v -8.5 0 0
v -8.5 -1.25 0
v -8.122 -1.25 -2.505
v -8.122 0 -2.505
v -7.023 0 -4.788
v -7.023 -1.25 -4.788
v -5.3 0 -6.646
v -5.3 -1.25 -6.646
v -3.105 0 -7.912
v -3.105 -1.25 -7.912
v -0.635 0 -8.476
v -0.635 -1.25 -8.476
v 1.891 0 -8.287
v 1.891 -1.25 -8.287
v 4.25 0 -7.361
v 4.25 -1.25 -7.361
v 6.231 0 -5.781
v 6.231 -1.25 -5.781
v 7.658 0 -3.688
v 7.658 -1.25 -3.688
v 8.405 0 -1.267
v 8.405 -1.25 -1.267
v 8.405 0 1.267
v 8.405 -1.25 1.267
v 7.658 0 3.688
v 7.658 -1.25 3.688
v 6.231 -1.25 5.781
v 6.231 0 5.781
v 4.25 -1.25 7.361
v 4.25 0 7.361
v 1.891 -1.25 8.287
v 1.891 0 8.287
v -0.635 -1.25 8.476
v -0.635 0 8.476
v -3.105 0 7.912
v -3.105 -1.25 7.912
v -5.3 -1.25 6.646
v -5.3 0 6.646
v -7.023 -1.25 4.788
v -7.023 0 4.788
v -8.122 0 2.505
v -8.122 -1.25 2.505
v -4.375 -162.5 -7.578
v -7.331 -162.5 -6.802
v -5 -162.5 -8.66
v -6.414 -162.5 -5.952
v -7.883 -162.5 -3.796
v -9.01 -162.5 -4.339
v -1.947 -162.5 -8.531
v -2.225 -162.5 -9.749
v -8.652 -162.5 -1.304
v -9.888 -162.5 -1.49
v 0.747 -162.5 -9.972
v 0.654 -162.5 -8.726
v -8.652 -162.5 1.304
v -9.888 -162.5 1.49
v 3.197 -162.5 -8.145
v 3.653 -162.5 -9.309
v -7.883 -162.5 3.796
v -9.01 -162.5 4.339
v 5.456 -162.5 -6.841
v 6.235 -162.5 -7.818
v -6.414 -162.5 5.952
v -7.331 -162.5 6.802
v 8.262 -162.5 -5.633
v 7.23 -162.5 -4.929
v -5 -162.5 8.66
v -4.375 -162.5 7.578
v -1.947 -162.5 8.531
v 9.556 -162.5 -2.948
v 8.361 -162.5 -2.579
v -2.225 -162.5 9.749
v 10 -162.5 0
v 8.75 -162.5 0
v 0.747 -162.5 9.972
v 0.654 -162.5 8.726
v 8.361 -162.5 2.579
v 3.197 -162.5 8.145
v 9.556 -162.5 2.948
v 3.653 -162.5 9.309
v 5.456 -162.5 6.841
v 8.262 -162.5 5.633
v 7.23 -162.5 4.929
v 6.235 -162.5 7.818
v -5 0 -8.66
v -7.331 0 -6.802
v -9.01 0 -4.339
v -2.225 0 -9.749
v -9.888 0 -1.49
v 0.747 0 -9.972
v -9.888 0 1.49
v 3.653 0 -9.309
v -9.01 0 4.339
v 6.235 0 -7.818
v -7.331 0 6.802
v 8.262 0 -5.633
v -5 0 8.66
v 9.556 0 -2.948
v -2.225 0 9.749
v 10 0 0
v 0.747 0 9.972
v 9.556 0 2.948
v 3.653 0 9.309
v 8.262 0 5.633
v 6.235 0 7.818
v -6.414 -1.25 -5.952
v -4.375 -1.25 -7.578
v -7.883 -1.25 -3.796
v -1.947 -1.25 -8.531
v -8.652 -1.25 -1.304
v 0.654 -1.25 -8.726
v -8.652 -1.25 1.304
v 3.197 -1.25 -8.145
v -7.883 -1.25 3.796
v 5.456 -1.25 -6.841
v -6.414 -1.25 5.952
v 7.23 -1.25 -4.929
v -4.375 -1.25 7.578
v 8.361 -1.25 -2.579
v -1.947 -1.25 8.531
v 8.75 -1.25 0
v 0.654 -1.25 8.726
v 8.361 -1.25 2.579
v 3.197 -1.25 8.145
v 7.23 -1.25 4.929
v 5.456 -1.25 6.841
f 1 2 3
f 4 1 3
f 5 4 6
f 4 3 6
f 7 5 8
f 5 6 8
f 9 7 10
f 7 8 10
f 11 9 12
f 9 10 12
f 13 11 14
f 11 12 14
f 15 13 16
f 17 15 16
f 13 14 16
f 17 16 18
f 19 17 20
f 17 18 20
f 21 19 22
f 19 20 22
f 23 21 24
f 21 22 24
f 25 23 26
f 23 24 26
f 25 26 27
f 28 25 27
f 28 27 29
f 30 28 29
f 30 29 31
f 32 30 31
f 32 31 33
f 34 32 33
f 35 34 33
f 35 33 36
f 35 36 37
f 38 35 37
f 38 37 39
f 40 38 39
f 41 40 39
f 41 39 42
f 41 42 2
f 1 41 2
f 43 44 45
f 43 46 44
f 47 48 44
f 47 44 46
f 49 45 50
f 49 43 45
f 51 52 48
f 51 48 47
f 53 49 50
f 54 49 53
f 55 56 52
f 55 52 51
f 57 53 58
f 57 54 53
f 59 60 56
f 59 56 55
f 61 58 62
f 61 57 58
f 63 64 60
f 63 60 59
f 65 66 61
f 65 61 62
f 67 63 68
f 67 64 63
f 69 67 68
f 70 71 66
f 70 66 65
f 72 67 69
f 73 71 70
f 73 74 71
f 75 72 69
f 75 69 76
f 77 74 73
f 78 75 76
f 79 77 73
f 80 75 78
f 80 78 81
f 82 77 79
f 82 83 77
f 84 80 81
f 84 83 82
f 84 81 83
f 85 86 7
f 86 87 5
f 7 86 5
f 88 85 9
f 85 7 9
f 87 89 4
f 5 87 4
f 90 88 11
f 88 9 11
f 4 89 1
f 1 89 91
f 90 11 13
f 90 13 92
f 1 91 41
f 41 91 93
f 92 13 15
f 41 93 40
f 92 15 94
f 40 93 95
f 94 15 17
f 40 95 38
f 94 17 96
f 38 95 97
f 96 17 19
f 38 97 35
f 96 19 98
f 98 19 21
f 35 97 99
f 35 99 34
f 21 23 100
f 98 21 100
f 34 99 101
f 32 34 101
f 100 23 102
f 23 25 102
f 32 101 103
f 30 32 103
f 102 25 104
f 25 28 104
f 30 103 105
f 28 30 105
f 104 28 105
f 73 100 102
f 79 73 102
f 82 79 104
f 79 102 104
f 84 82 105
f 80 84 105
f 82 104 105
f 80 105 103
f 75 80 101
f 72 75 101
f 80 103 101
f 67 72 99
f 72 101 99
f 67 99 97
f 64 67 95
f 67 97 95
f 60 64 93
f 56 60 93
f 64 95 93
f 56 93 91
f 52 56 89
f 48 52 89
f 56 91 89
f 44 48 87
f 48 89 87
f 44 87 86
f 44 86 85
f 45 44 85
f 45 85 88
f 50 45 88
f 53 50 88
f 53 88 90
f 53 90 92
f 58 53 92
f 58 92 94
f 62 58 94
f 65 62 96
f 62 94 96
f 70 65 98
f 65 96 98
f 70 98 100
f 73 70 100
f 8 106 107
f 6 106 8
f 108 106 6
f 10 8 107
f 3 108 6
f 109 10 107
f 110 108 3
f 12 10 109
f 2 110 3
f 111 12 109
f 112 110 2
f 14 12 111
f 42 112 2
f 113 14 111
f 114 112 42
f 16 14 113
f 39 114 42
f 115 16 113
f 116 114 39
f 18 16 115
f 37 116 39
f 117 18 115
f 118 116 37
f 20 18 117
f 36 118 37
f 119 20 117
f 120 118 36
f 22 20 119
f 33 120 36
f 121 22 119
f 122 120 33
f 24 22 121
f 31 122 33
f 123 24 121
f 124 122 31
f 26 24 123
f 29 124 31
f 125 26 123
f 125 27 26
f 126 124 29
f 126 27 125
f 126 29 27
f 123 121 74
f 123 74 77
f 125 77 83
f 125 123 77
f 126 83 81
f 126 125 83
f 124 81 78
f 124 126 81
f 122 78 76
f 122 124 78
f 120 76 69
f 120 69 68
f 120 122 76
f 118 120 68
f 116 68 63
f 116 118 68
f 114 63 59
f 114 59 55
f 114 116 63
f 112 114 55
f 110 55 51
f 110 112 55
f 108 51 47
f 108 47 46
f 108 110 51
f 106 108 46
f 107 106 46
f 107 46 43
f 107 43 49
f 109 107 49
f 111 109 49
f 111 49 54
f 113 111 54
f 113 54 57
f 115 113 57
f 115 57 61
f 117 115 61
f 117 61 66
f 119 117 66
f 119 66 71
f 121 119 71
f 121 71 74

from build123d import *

# Parameters (mm, degrees)
F0_R     = 10
F1_DEPTH = 162.5
F2_T     = -1.25
F3_D     = 17


with BuildPart() as f1:
    # F0 (on Front) → F1 (new body)
    with BuildSketch(Plane.XZ):
        Circle(F0_R)
    extrude(amount=F1_DEPTH)

    # F2
    f2_openings = [f1.faces().sort_by_distance(p)[0] for p in [
        (0, -162.5, 0),
    ]]
    offset(amount=F2_T, openings=f2_openings)

    # F3 (through all)
    with Locations(Plane(origin=(0, 0, 0), x_dir=(1, 0, 0), z_dir=(0, 1, 0))):
        with Locations((0, 0)):
            Hole(F3_D / 2)


solid = f1.part
